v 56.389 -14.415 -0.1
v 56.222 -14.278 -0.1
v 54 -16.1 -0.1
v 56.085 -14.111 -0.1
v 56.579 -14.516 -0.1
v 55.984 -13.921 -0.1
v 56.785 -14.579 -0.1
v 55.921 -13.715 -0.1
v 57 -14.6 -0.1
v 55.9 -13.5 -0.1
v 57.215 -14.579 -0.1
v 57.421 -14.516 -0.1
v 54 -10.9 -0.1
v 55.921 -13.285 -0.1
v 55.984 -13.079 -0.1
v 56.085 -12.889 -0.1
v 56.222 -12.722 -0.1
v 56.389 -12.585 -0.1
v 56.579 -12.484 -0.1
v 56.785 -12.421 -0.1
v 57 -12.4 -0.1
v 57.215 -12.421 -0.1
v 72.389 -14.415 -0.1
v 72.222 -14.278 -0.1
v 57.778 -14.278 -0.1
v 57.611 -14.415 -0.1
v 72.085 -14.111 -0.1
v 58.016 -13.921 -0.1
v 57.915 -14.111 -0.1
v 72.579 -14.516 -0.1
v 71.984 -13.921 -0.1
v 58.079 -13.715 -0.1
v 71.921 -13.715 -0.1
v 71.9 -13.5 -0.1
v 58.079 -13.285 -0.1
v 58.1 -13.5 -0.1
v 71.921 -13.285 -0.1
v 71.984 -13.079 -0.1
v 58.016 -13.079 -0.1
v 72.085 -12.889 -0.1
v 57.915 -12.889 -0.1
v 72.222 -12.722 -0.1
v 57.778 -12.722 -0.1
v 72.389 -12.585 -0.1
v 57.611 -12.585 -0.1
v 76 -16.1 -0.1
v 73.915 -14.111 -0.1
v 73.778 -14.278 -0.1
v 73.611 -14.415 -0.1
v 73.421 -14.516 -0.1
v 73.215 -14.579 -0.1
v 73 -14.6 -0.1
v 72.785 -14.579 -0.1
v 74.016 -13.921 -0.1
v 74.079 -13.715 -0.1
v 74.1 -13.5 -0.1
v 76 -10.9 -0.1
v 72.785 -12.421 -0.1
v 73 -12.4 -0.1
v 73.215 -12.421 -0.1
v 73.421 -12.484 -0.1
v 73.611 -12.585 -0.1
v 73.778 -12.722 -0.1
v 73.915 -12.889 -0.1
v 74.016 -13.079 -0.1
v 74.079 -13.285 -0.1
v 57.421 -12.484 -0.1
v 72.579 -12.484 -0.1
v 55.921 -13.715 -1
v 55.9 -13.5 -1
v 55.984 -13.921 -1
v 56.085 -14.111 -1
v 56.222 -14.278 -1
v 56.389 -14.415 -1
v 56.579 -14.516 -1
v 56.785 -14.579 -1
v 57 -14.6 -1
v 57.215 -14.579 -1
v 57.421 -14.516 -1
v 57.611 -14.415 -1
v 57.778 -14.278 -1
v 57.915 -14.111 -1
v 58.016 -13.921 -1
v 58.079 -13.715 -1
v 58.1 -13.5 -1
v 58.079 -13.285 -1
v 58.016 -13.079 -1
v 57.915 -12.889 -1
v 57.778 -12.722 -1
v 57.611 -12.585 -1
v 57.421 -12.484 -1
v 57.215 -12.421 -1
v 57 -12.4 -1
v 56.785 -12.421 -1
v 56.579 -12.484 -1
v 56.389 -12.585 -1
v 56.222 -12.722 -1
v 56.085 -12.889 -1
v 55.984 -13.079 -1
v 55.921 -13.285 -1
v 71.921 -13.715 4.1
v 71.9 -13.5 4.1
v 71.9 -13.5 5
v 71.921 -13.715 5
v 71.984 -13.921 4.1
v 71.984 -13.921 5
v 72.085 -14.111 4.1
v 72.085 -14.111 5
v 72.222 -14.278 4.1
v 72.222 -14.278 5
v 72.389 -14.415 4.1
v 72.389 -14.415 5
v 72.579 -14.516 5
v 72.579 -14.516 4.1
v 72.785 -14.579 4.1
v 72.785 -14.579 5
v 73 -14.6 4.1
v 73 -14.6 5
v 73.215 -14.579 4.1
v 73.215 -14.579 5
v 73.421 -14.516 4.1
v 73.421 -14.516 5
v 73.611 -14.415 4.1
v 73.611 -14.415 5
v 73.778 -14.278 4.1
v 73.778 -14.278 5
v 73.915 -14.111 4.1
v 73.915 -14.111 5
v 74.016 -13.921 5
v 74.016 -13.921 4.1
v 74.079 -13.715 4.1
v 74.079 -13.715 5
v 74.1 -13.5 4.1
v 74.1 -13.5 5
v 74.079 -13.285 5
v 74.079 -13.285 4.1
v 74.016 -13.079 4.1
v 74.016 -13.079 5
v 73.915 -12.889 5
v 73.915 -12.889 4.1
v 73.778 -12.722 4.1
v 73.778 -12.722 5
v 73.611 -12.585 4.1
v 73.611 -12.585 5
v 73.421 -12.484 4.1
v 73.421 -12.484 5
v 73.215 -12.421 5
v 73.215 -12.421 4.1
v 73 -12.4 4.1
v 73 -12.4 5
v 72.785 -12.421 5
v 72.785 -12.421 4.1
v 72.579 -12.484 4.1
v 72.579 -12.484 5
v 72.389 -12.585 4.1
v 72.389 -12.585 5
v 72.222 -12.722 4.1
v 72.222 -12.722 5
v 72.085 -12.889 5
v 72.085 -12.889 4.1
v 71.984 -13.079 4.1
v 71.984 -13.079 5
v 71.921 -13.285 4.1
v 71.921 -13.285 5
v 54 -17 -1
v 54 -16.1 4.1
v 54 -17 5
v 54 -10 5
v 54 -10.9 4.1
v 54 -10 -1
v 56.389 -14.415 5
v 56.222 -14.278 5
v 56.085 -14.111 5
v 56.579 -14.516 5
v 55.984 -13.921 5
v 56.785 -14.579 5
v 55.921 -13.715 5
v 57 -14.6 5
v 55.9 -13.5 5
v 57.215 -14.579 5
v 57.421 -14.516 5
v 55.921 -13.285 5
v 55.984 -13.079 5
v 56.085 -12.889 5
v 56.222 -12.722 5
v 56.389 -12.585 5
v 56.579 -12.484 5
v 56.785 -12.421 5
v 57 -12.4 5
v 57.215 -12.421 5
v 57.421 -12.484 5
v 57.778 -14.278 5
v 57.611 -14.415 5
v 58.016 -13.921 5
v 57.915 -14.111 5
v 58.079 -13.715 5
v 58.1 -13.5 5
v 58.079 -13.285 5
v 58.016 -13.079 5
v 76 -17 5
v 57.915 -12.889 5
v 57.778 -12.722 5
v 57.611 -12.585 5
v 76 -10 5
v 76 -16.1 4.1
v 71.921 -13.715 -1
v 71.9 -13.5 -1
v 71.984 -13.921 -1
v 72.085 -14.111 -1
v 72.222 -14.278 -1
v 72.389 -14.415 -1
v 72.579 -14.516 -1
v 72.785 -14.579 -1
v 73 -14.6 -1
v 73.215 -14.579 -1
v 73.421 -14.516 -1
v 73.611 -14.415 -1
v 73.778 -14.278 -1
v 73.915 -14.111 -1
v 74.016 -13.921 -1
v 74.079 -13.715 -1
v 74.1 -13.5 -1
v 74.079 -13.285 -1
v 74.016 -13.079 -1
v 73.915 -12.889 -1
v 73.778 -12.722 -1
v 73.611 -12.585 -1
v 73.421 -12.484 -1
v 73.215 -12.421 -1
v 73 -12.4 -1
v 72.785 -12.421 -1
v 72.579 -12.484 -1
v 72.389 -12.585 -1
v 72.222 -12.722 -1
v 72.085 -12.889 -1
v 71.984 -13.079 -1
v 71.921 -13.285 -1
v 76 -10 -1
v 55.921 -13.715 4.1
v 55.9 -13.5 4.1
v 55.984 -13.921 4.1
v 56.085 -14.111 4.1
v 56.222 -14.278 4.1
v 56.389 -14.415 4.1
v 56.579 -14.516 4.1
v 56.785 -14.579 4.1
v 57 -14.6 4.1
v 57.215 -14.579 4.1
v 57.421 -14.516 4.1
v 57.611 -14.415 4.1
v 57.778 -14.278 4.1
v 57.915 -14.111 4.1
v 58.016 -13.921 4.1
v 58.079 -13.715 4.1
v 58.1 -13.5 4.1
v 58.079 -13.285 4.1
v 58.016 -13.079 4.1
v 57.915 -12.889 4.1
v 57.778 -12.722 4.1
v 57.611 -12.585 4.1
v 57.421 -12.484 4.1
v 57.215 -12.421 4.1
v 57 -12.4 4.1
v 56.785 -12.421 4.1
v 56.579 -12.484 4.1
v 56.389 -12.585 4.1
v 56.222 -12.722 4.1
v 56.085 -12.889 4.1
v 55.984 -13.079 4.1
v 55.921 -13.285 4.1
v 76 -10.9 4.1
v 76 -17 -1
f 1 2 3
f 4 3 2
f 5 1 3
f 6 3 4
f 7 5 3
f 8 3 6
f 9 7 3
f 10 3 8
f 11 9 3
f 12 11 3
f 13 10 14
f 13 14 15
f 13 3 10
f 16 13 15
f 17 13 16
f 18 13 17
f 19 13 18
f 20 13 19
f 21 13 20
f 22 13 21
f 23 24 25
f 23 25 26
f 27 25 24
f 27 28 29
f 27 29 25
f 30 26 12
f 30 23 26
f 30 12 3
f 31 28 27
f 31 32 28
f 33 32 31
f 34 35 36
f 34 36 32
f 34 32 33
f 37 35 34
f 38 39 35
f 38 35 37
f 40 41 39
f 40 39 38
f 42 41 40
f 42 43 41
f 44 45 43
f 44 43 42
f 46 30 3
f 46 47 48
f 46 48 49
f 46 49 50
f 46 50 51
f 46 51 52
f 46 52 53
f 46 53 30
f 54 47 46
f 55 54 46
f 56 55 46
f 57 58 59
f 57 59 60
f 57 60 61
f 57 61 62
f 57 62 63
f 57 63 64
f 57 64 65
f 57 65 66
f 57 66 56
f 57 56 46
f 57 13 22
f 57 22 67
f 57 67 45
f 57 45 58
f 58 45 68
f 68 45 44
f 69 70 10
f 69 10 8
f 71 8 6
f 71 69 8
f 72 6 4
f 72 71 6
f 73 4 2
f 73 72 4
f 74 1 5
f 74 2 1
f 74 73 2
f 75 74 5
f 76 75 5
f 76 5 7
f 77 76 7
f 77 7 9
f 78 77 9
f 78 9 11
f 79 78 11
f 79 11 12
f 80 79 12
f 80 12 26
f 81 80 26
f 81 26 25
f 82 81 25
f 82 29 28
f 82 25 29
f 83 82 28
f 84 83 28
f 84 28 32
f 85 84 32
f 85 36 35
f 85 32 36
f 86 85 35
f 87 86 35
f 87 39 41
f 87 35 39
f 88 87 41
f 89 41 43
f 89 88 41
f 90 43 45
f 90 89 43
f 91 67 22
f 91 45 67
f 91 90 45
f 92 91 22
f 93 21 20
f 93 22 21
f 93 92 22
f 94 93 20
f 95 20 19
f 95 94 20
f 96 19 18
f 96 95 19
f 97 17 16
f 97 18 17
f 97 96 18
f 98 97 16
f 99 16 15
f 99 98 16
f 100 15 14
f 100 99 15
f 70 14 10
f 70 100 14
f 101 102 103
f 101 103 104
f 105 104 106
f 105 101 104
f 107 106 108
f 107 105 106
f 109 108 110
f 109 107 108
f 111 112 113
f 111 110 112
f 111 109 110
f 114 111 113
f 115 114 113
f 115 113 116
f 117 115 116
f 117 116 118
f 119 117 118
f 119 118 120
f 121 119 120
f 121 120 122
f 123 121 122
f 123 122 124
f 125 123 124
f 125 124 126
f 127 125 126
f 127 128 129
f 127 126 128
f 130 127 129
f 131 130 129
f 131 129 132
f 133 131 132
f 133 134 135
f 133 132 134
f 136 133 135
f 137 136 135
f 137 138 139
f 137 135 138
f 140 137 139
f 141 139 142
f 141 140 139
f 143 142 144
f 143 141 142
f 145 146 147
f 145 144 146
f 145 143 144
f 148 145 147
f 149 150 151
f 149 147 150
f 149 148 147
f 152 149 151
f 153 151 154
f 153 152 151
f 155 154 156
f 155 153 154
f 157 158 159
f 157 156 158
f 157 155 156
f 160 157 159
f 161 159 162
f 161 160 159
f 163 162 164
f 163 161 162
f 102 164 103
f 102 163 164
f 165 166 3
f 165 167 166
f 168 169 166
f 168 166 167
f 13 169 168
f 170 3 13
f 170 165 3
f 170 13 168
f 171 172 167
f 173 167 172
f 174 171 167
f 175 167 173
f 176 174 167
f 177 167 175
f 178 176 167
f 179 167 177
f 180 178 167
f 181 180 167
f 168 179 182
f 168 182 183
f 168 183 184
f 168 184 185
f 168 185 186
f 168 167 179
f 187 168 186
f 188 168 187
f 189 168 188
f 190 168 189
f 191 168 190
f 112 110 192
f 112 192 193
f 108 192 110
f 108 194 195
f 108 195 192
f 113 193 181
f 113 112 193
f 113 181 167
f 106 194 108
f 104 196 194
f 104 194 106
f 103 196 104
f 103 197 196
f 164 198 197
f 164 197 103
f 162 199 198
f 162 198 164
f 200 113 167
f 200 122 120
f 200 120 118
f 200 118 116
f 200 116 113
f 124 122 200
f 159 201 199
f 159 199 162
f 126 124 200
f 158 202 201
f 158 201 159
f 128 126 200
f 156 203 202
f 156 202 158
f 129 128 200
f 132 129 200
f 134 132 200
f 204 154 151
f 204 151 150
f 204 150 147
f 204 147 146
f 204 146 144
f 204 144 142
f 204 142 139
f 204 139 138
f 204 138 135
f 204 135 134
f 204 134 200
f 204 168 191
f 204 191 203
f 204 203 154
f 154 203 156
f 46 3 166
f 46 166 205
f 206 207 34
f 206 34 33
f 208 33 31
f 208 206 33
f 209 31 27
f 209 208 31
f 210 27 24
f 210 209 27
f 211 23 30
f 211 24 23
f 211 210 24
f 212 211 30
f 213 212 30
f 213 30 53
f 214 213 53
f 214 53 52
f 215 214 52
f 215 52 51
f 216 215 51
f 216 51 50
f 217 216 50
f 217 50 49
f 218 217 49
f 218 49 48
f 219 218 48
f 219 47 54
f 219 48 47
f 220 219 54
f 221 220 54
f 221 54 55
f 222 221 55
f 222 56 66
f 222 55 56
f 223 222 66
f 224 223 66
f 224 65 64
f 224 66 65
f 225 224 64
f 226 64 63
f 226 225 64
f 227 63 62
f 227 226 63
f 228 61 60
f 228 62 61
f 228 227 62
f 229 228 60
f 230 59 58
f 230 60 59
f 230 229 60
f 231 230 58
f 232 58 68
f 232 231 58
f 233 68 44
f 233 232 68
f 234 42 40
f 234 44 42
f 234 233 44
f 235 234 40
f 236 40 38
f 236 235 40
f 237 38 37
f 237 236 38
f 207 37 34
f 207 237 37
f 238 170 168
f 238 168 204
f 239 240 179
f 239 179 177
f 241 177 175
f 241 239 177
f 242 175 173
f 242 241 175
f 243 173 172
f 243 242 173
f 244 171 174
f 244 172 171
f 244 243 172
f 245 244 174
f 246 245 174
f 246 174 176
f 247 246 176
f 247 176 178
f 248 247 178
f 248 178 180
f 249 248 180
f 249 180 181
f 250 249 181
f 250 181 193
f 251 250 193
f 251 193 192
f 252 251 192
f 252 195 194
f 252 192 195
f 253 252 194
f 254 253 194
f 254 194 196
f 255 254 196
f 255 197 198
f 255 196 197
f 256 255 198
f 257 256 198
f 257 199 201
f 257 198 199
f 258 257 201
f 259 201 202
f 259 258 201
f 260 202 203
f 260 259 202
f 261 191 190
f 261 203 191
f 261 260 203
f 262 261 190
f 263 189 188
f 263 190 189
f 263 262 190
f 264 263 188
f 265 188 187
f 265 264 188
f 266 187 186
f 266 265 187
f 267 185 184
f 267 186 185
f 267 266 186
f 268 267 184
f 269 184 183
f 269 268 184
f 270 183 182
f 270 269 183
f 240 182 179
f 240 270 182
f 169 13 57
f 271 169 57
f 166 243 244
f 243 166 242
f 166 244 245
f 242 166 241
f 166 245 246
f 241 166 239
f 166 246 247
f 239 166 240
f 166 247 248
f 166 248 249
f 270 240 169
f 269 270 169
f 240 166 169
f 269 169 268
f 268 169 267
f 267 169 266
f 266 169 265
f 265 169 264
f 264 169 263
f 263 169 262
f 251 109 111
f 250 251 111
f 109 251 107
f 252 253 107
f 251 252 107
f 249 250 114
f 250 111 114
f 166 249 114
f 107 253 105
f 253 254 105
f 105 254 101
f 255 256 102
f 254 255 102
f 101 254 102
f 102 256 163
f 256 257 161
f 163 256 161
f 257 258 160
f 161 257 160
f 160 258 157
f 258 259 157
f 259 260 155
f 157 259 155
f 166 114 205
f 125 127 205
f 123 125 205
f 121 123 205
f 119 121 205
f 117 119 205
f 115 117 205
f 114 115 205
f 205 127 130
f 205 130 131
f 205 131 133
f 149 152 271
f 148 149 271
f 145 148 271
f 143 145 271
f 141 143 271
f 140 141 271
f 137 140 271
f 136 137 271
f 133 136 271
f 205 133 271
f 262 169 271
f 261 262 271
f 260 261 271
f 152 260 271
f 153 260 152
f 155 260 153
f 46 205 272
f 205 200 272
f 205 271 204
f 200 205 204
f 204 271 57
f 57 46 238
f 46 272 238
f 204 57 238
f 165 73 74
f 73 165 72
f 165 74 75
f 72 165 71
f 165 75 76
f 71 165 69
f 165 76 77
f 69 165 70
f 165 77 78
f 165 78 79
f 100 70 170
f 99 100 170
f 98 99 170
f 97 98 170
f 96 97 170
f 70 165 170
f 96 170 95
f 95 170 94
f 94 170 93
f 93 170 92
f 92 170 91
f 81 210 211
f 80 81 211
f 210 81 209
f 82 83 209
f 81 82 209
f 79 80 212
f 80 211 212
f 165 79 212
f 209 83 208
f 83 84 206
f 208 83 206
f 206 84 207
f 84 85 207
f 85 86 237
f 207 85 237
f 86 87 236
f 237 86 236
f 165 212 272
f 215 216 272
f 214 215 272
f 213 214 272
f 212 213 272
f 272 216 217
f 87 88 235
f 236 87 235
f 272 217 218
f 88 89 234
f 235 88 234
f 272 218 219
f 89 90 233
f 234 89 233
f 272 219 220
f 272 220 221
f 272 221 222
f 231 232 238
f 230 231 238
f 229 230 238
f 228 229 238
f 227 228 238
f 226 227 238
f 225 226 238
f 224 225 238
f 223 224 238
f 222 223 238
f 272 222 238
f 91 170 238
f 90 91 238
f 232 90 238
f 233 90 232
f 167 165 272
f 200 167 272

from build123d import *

# Parameters (mm, degrees)
SOFT_CONTACT_AND_WRAP_START     = -1
SOFT_CONTACT_AND_WRAP_PROFILE_W = 22
SOFT_CONTACT_AND_WRAP_PROFILE_H = 7
SOFT_CONTACT_AND_WRAP_DEPTH     = 6
SLIP_POCKET_START               = -0.1
FIXED_BAR_SLIP_POCKET_PROFILE_W = 24
FIXED_BAR_SLIP_POCKET_PROFILE_H = 5.2
SLIP_POCKET_DEPTH               = 4.2
PAD_CAPTURE_M2_START            = -50
PAD_CAPTURE_M2_PROFILE_R        = 1.1
PAD_CAPTURE_M2_DEPTH            = 129.038452061


with BuildPart() as part:
    # Soft_contact_and_wrap_profile → Soft_contact_and_wrap (new body)
    with BuildSketch(Plane.XY.offset(SOFT_CONTACT_AND_WRAP_START)):
        with Locations((65, -13.5)):
            Rectangle(SOFT_CONTACT_AND_WRAP_PROFILE_W, SOFT_CONTACT_AND_WRAP_PROFILE_H)
    extrude(amount=SOFT_CONTACT_AND_WRAP_DEPTH)

    # Fixed_bar_slip_pocket_profile → Slip_pocket (cut)
    with BuildSketch(Plane.XY.offset(SLIP_POCKET_START)):
        with Locations((65, -13.5)):
            Rectangle(FIXED_BAR_SLIP_POCKET_PROFILE_W, FIXED_BAR_SLIP_POCKET_PROFILE_H)
    extrude(amount=SLIP_POCKET_DEPTH, mode=Mode.SUBTRACT)

    # Pad_capture_M2_profile → Pad_capture_M2 (cut, through all)
    with BuildSketch(Plane.XY.offset(PAD_CAPTURE_M2_START)):
        with Locations(Location((57, -13.5, 0), (0, 0, 180))):
            Circle(PAD_CAPTURE_M2_PROFILE_R)
        with Locations(Location((73, -13.5, 0), (0, 0, 180))):
            Circle(PAD_CAPTURE_M2_PROFILE_R)
    extrude(amount=PAD_CAPTURE_M2_DEPTH, mode=Mode.SUBTRACT)


solid = part.part
